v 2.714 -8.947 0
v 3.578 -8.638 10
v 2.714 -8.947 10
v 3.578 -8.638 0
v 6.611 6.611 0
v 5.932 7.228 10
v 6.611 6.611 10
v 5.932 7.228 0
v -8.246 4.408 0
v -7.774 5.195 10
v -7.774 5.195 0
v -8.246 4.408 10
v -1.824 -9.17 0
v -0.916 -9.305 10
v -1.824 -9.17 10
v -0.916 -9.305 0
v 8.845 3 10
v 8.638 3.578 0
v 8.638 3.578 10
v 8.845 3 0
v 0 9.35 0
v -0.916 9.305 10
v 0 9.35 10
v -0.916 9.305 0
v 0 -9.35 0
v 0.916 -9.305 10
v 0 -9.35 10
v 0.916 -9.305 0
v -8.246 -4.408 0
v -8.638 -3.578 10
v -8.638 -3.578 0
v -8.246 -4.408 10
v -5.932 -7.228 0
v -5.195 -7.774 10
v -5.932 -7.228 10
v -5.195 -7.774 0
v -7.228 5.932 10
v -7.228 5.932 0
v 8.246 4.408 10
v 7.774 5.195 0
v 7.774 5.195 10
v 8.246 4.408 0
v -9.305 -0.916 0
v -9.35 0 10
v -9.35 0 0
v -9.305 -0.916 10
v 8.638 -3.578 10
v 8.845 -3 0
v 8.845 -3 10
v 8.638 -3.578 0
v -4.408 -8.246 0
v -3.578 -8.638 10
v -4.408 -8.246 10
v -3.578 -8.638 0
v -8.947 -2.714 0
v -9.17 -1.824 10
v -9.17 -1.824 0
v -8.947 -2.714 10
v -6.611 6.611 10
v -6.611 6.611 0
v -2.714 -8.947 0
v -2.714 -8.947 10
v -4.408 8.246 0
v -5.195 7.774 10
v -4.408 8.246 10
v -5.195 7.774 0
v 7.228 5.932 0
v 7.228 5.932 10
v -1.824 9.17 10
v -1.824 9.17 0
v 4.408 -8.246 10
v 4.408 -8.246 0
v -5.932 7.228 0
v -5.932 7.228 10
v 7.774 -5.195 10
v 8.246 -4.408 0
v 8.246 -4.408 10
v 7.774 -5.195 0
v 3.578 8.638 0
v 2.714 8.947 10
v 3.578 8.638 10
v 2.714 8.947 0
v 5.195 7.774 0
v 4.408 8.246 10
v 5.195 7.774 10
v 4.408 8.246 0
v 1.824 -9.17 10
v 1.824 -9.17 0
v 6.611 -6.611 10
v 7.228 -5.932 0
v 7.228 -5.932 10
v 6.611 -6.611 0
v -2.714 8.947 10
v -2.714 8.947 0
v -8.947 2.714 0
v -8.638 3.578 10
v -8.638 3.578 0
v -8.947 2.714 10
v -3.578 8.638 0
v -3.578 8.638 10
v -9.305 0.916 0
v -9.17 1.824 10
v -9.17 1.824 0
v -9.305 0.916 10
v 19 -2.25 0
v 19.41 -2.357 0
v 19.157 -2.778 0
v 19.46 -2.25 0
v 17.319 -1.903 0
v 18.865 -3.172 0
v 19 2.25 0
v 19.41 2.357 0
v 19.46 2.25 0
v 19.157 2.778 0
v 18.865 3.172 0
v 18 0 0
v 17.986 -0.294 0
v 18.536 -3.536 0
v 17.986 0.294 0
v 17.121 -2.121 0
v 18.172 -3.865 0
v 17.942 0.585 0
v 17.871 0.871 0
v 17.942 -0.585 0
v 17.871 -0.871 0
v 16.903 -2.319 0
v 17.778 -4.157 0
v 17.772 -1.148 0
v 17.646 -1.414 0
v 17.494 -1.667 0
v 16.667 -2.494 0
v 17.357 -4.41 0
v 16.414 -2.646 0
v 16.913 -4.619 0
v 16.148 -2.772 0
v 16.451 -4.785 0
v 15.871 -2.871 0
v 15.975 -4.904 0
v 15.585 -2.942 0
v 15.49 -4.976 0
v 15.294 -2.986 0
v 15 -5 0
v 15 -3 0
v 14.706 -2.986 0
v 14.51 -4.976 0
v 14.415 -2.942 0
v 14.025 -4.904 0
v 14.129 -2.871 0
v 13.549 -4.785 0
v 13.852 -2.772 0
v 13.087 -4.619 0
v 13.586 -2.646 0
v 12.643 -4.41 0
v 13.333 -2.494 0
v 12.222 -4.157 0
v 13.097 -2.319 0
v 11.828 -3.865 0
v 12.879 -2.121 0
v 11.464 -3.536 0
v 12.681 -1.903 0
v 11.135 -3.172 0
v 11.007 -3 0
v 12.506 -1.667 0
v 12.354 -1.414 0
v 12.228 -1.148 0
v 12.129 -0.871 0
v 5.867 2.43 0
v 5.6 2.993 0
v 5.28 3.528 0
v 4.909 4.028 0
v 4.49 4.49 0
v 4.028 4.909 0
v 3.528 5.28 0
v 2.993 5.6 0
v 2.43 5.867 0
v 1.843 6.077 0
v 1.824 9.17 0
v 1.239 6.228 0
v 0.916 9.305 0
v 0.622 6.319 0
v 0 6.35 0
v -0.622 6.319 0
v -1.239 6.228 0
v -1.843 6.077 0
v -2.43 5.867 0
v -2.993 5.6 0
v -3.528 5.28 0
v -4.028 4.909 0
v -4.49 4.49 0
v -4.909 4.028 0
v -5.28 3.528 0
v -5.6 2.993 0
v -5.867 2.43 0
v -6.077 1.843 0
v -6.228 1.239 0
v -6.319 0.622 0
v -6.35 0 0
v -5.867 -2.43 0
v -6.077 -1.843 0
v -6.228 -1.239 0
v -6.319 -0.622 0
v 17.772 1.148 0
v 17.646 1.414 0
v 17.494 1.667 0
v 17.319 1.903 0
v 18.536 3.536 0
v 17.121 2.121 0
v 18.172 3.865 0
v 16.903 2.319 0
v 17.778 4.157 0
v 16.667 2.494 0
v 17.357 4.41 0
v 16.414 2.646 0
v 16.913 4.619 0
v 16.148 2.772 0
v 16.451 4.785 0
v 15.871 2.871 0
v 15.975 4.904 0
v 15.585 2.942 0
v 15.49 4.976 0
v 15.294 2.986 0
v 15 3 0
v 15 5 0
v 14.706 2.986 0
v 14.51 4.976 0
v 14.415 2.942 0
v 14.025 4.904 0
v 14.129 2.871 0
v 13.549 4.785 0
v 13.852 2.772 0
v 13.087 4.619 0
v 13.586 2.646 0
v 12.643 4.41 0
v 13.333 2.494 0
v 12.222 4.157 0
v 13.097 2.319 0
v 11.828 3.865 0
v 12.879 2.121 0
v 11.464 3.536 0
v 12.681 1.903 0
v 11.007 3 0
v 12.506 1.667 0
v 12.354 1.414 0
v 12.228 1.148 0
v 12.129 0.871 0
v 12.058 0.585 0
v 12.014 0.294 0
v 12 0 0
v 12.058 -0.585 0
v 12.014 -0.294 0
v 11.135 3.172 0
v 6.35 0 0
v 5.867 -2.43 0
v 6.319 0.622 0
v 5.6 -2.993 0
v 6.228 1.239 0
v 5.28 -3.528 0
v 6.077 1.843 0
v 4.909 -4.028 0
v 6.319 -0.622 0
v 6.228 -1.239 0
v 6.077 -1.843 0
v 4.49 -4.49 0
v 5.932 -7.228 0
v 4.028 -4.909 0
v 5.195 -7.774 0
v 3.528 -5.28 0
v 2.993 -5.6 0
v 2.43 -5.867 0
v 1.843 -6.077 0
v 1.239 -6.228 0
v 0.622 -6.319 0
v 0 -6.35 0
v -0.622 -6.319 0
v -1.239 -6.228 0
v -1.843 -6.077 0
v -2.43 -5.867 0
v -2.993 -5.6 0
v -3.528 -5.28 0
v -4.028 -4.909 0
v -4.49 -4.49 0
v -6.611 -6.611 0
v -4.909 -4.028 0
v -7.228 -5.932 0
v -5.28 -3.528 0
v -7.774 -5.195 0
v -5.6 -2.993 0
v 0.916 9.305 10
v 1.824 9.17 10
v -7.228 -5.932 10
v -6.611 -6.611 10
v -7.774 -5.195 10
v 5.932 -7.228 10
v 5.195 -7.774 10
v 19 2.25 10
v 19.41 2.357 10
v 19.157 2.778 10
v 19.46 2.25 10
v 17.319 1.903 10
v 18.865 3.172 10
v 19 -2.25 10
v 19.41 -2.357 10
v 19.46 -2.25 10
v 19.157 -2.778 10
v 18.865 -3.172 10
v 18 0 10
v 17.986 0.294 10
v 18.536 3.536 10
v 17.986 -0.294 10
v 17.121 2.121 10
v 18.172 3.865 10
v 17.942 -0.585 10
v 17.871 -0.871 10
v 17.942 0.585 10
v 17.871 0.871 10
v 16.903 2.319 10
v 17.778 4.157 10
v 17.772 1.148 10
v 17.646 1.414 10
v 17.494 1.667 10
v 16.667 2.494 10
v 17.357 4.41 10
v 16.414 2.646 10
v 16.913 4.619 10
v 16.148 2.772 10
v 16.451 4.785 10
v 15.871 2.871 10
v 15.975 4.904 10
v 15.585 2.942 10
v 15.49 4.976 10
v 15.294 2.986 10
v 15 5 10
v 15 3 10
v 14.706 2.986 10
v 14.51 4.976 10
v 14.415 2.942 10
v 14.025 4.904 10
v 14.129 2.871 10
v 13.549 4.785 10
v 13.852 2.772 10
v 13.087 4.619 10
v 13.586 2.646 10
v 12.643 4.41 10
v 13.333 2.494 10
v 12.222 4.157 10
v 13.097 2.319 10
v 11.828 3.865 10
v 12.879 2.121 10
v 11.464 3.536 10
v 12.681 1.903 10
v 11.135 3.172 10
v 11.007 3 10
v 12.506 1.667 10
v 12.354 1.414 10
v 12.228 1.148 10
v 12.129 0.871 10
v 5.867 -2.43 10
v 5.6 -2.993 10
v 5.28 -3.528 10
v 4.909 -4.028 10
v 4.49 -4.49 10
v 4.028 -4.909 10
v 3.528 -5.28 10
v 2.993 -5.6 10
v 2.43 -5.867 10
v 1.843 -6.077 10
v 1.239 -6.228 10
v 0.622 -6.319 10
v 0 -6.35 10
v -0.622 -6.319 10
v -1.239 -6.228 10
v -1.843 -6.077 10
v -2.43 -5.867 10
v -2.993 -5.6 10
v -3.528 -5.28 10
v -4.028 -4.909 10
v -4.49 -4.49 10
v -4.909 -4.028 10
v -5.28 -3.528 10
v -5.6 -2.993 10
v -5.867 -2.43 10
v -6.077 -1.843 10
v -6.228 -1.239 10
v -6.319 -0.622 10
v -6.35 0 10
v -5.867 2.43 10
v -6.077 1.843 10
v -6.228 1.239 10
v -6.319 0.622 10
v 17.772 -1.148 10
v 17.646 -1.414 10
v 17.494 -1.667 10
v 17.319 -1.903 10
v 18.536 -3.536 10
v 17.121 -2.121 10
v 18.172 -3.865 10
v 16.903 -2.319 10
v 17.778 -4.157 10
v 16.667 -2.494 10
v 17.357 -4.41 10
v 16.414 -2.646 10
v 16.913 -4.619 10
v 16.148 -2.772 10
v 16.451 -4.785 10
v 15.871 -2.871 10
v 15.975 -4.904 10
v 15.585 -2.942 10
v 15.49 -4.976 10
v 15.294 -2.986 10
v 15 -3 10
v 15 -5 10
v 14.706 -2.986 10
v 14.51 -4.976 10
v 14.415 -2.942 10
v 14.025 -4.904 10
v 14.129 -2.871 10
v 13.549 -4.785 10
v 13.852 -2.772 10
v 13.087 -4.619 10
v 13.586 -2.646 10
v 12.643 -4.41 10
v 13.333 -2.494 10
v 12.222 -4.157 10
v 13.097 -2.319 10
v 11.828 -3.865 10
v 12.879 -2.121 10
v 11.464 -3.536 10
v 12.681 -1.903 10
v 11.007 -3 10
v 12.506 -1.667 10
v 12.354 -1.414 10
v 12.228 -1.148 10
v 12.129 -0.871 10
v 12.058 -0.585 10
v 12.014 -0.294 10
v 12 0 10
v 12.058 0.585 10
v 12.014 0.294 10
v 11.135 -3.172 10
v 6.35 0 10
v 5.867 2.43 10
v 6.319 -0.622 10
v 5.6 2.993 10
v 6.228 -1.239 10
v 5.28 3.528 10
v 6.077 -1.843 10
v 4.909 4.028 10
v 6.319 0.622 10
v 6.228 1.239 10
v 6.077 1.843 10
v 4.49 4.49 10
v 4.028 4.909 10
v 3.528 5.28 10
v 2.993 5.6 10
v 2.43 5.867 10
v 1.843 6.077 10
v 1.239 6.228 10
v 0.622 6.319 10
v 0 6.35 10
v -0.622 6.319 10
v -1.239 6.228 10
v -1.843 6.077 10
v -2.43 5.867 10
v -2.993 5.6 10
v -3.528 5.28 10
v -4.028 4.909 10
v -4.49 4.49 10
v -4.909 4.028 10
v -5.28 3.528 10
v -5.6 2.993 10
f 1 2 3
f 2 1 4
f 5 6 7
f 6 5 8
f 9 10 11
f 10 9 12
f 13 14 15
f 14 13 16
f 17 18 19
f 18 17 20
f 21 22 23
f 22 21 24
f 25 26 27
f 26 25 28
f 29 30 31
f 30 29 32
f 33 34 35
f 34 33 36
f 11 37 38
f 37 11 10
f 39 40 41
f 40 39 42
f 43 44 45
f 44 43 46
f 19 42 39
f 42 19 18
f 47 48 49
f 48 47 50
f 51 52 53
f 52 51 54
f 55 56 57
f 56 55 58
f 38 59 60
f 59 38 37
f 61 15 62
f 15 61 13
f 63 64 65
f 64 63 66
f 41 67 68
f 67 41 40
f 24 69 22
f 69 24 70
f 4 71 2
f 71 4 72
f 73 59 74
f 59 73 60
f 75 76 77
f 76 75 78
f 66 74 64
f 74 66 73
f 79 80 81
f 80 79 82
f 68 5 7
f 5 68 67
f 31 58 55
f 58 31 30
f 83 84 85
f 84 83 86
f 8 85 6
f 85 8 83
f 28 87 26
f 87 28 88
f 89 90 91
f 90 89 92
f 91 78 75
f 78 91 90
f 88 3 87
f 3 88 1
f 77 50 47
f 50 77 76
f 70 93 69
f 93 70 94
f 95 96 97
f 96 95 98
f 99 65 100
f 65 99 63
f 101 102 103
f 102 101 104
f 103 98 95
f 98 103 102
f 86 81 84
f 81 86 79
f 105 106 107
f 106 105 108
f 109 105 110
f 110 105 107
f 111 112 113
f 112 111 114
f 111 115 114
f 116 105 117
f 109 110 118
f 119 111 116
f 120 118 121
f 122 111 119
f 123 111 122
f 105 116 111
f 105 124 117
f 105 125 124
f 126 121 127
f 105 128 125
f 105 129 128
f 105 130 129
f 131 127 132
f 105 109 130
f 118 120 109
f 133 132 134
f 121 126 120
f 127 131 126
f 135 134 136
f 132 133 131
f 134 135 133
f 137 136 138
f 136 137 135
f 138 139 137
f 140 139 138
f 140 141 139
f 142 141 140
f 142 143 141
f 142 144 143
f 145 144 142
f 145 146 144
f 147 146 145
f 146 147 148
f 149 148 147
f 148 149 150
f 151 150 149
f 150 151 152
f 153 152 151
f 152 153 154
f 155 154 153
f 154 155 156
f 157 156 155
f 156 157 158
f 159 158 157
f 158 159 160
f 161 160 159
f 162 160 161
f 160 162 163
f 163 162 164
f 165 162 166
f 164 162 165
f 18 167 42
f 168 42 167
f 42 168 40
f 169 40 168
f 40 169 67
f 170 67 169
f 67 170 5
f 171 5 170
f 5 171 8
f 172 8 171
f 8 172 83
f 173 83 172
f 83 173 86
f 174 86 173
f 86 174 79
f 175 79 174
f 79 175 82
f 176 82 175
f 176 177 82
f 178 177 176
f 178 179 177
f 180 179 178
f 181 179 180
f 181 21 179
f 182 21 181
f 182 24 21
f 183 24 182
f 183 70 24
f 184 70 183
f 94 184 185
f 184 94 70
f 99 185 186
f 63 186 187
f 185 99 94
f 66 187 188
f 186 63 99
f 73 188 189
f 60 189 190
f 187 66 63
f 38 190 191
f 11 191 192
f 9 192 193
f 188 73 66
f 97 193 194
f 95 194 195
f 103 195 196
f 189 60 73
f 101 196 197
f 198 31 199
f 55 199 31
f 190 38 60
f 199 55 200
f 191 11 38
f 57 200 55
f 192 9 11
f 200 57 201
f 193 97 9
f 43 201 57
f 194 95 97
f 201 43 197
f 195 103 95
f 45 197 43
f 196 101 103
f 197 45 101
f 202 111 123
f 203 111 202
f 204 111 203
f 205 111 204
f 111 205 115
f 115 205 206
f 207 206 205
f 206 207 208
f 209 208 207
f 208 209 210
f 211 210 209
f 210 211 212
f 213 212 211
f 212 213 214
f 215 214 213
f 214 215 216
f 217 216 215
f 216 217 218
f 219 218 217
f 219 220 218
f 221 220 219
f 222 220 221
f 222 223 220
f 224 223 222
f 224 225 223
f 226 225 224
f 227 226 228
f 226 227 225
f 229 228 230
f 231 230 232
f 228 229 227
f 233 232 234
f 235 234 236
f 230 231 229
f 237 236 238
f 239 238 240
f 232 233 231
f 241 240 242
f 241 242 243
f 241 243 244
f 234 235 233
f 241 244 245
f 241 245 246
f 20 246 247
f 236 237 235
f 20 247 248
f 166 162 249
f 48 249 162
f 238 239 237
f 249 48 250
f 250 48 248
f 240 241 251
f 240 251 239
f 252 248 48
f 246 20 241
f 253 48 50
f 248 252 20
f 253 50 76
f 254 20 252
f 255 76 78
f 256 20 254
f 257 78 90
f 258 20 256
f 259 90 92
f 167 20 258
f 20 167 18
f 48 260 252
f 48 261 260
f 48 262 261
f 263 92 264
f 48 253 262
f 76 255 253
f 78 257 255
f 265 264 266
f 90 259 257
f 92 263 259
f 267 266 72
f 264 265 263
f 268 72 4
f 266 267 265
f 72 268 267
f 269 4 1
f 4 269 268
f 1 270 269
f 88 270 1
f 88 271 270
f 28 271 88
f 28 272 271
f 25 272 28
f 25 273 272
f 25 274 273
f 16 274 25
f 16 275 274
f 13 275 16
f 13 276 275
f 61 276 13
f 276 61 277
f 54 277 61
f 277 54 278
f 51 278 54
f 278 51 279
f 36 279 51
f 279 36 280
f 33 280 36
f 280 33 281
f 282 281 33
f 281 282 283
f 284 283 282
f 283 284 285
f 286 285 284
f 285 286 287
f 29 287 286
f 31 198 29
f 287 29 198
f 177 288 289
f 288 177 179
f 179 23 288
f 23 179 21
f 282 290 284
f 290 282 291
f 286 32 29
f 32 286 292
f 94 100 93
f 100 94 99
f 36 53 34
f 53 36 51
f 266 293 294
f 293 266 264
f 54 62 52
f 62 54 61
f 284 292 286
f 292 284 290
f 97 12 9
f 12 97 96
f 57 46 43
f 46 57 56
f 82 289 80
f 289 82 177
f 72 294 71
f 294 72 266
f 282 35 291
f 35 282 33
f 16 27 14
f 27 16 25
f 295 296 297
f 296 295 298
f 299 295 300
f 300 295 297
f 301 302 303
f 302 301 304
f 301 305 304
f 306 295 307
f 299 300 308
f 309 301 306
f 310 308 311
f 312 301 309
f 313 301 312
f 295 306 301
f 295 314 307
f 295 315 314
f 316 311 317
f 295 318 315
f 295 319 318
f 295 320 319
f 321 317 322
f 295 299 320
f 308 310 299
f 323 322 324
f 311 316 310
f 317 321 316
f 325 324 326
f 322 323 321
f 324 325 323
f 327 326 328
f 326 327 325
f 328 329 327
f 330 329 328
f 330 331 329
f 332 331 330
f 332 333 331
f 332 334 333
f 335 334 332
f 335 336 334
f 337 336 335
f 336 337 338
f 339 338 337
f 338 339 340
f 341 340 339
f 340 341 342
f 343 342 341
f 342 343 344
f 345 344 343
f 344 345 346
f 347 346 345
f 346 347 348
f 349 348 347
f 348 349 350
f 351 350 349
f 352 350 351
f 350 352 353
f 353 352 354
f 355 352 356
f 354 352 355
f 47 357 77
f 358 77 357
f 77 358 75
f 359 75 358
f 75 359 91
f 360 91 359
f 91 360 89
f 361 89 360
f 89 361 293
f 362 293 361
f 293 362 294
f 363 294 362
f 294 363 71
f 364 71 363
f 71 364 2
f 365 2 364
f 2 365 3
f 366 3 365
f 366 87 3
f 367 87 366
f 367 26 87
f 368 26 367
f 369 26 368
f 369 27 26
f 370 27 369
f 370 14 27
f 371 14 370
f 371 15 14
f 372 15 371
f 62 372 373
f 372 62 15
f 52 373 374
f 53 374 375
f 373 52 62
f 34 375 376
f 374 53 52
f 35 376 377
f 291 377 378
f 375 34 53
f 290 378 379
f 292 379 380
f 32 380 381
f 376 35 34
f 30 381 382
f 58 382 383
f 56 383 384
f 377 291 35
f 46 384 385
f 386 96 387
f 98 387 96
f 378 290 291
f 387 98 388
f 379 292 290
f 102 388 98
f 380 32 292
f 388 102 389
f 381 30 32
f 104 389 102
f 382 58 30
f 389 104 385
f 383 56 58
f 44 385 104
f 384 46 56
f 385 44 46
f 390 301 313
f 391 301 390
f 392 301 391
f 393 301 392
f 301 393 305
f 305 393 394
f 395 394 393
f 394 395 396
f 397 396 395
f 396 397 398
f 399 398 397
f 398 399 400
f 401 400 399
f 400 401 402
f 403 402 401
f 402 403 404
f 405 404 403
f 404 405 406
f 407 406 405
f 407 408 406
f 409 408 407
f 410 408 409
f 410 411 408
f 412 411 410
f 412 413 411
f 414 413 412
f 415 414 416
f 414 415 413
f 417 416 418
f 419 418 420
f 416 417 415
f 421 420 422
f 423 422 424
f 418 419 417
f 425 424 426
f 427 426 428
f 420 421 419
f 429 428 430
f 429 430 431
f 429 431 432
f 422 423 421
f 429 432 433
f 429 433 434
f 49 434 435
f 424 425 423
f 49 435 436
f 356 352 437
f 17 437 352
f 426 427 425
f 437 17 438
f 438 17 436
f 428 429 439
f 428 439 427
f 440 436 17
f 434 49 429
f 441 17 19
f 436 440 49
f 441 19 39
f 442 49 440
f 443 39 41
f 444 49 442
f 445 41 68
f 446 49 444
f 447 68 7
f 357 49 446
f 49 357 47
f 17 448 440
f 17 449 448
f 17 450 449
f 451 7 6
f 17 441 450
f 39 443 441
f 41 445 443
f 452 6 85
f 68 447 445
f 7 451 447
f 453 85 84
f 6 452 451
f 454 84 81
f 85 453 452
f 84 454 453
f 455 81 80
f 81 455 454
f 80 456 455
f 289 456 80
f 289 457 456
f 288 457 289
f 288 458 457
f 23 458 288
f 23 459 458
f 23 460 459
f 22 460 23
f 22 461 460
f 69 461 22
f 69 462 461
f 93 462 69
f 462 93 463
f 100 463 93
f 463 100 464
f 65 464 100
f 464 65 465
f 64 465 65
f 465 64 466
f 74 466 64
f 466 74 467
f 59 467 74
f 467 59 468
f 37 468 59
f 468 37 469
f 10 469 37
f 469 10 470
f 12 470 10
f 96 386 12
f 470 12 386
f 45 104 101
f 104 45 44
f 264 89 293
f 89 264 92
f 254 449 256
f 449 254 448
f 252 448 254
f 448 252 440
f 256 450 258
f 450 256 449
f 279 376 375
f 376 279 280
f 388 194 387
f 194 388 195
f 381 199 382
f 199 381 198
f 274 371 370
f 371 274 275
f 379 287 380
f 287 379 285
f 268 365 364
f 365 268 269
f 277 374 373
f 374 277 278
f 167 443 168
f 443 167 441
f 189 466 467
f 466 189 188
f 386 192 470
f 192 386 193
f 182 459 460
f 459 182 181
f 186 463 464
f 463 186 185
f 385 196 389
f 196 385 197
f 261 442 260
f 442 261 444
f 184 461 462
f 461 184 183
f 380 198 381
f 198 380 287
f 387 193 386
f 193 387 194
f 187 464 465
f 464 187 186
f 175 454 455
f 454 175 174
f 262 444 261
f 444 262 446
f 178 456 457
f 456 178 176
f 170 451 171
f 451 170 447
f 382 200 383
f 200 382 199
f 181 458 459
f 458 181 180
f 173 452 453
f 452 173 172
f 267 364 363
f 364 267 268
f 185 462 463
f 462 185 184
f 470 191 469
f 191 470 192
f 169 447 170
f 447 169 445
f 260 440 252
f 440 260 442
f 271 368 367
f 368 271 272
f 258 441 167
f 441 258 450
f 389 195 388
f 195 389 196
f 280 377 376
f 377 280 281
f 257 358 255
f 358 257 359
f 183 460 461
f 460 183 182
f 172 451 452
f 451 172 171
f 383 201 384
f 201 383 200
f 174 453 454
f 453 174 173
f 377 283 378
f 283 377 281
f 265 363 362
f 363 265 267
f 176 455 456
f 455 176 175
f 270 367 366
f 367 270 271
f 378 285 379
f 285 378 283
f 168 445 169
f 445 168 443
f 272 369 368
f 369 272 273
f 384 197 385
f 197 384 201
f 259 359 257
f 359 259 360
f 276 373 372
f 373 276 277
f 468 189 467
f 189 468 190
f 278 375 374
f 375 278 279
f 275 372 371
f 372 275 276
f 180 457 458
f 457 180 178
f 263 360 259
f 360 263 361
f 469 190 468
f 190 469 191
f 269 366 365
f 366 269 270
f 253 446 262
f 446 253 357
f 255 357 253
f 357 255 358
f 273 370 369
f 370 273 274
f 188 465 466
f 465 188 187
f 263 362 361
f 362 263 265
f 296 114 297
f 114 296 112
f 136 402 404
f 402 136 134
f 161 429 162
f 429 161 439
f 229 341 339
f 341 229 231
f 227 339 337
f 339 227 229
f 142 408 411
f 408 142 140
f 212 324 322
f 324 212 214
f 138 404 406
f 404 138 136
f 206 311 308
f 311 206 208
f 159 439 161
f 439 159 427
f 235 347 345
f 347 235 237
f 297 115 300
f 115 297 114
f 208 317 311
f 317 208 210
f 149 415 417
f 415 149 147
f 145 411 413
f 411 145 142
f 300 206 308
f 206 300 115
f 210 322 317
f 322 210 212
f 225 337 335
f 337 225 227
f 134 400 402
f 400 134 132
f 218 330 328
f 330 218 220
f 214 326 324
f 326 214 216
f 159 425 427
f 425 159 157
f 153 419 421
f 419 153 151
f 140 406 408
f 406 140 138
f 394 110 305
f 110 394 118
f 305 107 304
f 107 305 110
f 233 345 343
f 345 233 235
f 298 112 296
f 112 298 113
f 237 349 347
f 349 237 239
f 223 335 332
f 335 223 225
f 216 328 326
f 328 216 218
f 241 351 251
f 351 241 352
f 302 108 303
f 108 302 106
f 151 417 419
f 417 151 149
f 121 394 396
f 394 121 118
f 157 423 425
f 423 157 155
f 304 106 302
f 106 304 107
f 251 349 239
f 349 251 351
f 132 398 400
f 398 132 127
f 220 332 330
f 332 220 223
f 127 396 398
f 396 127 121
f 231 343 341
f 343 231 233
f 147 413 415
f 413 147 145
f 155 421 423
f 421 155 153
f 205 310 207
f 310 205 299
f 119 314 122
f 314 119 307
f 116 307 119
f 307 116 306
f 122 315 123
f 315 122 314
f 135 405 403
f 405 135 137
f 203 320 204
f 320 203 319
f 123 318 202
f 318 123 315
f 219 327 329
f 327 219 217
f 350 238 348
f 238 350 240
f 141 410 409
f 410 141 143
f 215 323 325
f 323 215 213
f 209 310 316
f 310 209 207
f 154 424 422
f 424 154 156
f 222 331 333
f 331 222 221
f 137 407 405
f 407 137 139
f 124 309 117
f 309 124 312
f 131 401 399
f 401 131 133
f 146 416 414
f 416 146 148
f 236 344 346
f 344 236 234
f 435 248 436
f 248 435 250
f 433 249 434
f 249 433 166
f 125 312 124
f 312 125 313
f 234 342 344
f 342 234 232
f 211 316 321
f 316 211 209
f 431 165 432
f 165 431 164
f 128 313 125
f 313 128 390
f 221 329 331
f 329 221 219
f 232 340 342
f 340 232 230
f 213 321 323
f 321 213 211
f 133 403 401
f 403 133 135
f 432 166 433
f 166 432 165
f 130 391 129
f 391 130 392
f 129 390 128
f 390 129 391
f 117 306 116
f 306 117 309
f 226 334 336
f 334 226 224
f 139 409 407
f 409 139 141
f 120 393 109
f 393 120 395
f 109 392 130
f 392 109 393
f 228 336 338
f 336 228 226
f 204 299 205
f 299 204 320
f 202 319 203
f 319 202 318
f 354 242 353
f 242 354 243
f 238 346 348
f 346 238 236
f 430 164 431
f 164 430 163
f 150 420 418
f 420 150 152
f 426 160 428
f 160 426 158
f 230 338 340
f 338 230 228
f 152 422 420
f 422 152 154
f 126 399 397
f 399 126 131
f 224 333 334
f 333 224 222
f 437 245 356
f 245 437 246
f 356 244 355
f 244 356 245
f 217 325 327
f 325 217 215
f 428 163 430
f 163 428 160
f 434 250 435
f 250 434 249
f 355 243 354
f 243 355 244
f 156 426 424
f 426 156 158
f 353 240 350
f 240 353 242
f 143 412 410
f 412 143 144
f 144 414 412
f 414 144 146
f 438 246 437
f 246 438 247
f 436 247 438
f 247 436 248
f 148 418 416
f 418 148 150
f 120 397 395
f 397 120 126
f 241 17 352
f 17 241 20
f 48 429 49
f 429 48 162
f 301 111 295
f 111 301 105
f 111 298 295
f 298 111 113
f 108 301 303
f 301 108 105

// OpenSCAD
// --- Dimensions (mm) ---
rod_inner_dia = 12.7;      // Inner diameter of the rod ring
rod_wall = 3.0;            // Wall thickness of the rod ring
rod_opening_w = 10.0;      // Width of the gap in the rod ring (X-axis span)
rod_opening_h = 10.0;      // Height of the gap in the rod ring (Y-axis span)

tube_inner_dia = 6.0;       // Inner diameter of the tubing ring
tube_wall = 2.0;           // Wall thickness of the tubing ring
tube_opening_w = 4.5;      // Width of the gap in the tubing ring (X-axis span)
tube_opening_h = 4.5;       // Height of the gap in the tubing ring (Y-axis span)

bridge_width_y = 6.0;      // Width of the bridge in the Y direction
bridge_x_start = 8.0;      // Start of the bridge on X axis
bridge_x_end = 12.0;        // End of the bridge on X axis

extrusion_height = 10.0;   // Total Z height of the part

// --- Constants ---
$fn = 64;

// --- Calculations ---
rod_outer_dia = rod_inner_dia + (2 * rod_wall);
tube_outer_dia = tube_inner_dia + (2 * tube_wall);
tube_center_x = 15.0;
tube_center_y = 0.0;

// --- Final Assembly ---
// The part is built from Z=0 to Z=10.
// We use a top-level translate to ensure the entire object starts at Z=0.
translate([0, 0, 0]) {
    difference() {
        // Main Body: Union of the two rings and the bridge
        union() {
            // 1. Rod Ring
            // Centered at origin, height 10, base at Z=0
            difference() {
                cylinder(d = rod_outer_dia, h = extrusion_height, center = false);
                // Subtract inner hole (extended to ensure clean cut)
                translate([0, 0, -1])
                    cylinder(d = rod_inner_dia, h = extrusion_height + 2, center = false);
            }

            // 2. Tubing Ring
            // Centered at x=15, y=0, height 10, base at Z=0
            translate([tube_center_x, tube_center_y, 0])
                difference() {
                    cylinder(d = tube_outer_dia, h = extrusion_height, center = false);
                    // Subtract inner hole (extended to ensure clean cut)
                    translate([0, 0, -1])
                        cylinder(d = tube_inner_dia, h = extrusion_height + 2, center = false);
                }

            // 3. Solid Bridge
            // Solid block between x=8 and x=12, width 6 in Y, height 10 in Z
            // Centered on Y=0, so Y goes from -3 to 3.
            translate([(bridge_x_start + bridge_x_end)/2, 0, extrusion_height/2])
                cube([bridge_x_end - bridge_x_start, bridge_width_y, extrusion_height], center = true);
        }

        // --- Subtractions (Openings) ---

        // Rod Ring Opening: x < 0 and -5 < y < 5
        // The rod ring is centered at 0,0. To cut the -X side, we place a cube 
        // that covers the area from x = -rod_outer_dia to x = 0.
        // We use a large X-offset to ensure it cuts through the ring.
        translate([-rod_outer_dia - 1, 0, extrusion_height/2])
            cube([rod_outer_dia + 2, rod_opening_h, extrusion_height + 2], center = true);

        // Tubing Ring Opening: x > 15 and -2.25 < y < 2.25
        // The tube center is at 15. To cut the +X side, we place a cube
        // that covers the area from x = 15 to x = 15 + tube_outer_dia.
        translate([tube_center_x + tube_outer_dia, 0, extrusion_height/2])
            cube([tube_outer_dia + 2, tube_opening_h, extrusion_height + 2], center = true);
    }
}
